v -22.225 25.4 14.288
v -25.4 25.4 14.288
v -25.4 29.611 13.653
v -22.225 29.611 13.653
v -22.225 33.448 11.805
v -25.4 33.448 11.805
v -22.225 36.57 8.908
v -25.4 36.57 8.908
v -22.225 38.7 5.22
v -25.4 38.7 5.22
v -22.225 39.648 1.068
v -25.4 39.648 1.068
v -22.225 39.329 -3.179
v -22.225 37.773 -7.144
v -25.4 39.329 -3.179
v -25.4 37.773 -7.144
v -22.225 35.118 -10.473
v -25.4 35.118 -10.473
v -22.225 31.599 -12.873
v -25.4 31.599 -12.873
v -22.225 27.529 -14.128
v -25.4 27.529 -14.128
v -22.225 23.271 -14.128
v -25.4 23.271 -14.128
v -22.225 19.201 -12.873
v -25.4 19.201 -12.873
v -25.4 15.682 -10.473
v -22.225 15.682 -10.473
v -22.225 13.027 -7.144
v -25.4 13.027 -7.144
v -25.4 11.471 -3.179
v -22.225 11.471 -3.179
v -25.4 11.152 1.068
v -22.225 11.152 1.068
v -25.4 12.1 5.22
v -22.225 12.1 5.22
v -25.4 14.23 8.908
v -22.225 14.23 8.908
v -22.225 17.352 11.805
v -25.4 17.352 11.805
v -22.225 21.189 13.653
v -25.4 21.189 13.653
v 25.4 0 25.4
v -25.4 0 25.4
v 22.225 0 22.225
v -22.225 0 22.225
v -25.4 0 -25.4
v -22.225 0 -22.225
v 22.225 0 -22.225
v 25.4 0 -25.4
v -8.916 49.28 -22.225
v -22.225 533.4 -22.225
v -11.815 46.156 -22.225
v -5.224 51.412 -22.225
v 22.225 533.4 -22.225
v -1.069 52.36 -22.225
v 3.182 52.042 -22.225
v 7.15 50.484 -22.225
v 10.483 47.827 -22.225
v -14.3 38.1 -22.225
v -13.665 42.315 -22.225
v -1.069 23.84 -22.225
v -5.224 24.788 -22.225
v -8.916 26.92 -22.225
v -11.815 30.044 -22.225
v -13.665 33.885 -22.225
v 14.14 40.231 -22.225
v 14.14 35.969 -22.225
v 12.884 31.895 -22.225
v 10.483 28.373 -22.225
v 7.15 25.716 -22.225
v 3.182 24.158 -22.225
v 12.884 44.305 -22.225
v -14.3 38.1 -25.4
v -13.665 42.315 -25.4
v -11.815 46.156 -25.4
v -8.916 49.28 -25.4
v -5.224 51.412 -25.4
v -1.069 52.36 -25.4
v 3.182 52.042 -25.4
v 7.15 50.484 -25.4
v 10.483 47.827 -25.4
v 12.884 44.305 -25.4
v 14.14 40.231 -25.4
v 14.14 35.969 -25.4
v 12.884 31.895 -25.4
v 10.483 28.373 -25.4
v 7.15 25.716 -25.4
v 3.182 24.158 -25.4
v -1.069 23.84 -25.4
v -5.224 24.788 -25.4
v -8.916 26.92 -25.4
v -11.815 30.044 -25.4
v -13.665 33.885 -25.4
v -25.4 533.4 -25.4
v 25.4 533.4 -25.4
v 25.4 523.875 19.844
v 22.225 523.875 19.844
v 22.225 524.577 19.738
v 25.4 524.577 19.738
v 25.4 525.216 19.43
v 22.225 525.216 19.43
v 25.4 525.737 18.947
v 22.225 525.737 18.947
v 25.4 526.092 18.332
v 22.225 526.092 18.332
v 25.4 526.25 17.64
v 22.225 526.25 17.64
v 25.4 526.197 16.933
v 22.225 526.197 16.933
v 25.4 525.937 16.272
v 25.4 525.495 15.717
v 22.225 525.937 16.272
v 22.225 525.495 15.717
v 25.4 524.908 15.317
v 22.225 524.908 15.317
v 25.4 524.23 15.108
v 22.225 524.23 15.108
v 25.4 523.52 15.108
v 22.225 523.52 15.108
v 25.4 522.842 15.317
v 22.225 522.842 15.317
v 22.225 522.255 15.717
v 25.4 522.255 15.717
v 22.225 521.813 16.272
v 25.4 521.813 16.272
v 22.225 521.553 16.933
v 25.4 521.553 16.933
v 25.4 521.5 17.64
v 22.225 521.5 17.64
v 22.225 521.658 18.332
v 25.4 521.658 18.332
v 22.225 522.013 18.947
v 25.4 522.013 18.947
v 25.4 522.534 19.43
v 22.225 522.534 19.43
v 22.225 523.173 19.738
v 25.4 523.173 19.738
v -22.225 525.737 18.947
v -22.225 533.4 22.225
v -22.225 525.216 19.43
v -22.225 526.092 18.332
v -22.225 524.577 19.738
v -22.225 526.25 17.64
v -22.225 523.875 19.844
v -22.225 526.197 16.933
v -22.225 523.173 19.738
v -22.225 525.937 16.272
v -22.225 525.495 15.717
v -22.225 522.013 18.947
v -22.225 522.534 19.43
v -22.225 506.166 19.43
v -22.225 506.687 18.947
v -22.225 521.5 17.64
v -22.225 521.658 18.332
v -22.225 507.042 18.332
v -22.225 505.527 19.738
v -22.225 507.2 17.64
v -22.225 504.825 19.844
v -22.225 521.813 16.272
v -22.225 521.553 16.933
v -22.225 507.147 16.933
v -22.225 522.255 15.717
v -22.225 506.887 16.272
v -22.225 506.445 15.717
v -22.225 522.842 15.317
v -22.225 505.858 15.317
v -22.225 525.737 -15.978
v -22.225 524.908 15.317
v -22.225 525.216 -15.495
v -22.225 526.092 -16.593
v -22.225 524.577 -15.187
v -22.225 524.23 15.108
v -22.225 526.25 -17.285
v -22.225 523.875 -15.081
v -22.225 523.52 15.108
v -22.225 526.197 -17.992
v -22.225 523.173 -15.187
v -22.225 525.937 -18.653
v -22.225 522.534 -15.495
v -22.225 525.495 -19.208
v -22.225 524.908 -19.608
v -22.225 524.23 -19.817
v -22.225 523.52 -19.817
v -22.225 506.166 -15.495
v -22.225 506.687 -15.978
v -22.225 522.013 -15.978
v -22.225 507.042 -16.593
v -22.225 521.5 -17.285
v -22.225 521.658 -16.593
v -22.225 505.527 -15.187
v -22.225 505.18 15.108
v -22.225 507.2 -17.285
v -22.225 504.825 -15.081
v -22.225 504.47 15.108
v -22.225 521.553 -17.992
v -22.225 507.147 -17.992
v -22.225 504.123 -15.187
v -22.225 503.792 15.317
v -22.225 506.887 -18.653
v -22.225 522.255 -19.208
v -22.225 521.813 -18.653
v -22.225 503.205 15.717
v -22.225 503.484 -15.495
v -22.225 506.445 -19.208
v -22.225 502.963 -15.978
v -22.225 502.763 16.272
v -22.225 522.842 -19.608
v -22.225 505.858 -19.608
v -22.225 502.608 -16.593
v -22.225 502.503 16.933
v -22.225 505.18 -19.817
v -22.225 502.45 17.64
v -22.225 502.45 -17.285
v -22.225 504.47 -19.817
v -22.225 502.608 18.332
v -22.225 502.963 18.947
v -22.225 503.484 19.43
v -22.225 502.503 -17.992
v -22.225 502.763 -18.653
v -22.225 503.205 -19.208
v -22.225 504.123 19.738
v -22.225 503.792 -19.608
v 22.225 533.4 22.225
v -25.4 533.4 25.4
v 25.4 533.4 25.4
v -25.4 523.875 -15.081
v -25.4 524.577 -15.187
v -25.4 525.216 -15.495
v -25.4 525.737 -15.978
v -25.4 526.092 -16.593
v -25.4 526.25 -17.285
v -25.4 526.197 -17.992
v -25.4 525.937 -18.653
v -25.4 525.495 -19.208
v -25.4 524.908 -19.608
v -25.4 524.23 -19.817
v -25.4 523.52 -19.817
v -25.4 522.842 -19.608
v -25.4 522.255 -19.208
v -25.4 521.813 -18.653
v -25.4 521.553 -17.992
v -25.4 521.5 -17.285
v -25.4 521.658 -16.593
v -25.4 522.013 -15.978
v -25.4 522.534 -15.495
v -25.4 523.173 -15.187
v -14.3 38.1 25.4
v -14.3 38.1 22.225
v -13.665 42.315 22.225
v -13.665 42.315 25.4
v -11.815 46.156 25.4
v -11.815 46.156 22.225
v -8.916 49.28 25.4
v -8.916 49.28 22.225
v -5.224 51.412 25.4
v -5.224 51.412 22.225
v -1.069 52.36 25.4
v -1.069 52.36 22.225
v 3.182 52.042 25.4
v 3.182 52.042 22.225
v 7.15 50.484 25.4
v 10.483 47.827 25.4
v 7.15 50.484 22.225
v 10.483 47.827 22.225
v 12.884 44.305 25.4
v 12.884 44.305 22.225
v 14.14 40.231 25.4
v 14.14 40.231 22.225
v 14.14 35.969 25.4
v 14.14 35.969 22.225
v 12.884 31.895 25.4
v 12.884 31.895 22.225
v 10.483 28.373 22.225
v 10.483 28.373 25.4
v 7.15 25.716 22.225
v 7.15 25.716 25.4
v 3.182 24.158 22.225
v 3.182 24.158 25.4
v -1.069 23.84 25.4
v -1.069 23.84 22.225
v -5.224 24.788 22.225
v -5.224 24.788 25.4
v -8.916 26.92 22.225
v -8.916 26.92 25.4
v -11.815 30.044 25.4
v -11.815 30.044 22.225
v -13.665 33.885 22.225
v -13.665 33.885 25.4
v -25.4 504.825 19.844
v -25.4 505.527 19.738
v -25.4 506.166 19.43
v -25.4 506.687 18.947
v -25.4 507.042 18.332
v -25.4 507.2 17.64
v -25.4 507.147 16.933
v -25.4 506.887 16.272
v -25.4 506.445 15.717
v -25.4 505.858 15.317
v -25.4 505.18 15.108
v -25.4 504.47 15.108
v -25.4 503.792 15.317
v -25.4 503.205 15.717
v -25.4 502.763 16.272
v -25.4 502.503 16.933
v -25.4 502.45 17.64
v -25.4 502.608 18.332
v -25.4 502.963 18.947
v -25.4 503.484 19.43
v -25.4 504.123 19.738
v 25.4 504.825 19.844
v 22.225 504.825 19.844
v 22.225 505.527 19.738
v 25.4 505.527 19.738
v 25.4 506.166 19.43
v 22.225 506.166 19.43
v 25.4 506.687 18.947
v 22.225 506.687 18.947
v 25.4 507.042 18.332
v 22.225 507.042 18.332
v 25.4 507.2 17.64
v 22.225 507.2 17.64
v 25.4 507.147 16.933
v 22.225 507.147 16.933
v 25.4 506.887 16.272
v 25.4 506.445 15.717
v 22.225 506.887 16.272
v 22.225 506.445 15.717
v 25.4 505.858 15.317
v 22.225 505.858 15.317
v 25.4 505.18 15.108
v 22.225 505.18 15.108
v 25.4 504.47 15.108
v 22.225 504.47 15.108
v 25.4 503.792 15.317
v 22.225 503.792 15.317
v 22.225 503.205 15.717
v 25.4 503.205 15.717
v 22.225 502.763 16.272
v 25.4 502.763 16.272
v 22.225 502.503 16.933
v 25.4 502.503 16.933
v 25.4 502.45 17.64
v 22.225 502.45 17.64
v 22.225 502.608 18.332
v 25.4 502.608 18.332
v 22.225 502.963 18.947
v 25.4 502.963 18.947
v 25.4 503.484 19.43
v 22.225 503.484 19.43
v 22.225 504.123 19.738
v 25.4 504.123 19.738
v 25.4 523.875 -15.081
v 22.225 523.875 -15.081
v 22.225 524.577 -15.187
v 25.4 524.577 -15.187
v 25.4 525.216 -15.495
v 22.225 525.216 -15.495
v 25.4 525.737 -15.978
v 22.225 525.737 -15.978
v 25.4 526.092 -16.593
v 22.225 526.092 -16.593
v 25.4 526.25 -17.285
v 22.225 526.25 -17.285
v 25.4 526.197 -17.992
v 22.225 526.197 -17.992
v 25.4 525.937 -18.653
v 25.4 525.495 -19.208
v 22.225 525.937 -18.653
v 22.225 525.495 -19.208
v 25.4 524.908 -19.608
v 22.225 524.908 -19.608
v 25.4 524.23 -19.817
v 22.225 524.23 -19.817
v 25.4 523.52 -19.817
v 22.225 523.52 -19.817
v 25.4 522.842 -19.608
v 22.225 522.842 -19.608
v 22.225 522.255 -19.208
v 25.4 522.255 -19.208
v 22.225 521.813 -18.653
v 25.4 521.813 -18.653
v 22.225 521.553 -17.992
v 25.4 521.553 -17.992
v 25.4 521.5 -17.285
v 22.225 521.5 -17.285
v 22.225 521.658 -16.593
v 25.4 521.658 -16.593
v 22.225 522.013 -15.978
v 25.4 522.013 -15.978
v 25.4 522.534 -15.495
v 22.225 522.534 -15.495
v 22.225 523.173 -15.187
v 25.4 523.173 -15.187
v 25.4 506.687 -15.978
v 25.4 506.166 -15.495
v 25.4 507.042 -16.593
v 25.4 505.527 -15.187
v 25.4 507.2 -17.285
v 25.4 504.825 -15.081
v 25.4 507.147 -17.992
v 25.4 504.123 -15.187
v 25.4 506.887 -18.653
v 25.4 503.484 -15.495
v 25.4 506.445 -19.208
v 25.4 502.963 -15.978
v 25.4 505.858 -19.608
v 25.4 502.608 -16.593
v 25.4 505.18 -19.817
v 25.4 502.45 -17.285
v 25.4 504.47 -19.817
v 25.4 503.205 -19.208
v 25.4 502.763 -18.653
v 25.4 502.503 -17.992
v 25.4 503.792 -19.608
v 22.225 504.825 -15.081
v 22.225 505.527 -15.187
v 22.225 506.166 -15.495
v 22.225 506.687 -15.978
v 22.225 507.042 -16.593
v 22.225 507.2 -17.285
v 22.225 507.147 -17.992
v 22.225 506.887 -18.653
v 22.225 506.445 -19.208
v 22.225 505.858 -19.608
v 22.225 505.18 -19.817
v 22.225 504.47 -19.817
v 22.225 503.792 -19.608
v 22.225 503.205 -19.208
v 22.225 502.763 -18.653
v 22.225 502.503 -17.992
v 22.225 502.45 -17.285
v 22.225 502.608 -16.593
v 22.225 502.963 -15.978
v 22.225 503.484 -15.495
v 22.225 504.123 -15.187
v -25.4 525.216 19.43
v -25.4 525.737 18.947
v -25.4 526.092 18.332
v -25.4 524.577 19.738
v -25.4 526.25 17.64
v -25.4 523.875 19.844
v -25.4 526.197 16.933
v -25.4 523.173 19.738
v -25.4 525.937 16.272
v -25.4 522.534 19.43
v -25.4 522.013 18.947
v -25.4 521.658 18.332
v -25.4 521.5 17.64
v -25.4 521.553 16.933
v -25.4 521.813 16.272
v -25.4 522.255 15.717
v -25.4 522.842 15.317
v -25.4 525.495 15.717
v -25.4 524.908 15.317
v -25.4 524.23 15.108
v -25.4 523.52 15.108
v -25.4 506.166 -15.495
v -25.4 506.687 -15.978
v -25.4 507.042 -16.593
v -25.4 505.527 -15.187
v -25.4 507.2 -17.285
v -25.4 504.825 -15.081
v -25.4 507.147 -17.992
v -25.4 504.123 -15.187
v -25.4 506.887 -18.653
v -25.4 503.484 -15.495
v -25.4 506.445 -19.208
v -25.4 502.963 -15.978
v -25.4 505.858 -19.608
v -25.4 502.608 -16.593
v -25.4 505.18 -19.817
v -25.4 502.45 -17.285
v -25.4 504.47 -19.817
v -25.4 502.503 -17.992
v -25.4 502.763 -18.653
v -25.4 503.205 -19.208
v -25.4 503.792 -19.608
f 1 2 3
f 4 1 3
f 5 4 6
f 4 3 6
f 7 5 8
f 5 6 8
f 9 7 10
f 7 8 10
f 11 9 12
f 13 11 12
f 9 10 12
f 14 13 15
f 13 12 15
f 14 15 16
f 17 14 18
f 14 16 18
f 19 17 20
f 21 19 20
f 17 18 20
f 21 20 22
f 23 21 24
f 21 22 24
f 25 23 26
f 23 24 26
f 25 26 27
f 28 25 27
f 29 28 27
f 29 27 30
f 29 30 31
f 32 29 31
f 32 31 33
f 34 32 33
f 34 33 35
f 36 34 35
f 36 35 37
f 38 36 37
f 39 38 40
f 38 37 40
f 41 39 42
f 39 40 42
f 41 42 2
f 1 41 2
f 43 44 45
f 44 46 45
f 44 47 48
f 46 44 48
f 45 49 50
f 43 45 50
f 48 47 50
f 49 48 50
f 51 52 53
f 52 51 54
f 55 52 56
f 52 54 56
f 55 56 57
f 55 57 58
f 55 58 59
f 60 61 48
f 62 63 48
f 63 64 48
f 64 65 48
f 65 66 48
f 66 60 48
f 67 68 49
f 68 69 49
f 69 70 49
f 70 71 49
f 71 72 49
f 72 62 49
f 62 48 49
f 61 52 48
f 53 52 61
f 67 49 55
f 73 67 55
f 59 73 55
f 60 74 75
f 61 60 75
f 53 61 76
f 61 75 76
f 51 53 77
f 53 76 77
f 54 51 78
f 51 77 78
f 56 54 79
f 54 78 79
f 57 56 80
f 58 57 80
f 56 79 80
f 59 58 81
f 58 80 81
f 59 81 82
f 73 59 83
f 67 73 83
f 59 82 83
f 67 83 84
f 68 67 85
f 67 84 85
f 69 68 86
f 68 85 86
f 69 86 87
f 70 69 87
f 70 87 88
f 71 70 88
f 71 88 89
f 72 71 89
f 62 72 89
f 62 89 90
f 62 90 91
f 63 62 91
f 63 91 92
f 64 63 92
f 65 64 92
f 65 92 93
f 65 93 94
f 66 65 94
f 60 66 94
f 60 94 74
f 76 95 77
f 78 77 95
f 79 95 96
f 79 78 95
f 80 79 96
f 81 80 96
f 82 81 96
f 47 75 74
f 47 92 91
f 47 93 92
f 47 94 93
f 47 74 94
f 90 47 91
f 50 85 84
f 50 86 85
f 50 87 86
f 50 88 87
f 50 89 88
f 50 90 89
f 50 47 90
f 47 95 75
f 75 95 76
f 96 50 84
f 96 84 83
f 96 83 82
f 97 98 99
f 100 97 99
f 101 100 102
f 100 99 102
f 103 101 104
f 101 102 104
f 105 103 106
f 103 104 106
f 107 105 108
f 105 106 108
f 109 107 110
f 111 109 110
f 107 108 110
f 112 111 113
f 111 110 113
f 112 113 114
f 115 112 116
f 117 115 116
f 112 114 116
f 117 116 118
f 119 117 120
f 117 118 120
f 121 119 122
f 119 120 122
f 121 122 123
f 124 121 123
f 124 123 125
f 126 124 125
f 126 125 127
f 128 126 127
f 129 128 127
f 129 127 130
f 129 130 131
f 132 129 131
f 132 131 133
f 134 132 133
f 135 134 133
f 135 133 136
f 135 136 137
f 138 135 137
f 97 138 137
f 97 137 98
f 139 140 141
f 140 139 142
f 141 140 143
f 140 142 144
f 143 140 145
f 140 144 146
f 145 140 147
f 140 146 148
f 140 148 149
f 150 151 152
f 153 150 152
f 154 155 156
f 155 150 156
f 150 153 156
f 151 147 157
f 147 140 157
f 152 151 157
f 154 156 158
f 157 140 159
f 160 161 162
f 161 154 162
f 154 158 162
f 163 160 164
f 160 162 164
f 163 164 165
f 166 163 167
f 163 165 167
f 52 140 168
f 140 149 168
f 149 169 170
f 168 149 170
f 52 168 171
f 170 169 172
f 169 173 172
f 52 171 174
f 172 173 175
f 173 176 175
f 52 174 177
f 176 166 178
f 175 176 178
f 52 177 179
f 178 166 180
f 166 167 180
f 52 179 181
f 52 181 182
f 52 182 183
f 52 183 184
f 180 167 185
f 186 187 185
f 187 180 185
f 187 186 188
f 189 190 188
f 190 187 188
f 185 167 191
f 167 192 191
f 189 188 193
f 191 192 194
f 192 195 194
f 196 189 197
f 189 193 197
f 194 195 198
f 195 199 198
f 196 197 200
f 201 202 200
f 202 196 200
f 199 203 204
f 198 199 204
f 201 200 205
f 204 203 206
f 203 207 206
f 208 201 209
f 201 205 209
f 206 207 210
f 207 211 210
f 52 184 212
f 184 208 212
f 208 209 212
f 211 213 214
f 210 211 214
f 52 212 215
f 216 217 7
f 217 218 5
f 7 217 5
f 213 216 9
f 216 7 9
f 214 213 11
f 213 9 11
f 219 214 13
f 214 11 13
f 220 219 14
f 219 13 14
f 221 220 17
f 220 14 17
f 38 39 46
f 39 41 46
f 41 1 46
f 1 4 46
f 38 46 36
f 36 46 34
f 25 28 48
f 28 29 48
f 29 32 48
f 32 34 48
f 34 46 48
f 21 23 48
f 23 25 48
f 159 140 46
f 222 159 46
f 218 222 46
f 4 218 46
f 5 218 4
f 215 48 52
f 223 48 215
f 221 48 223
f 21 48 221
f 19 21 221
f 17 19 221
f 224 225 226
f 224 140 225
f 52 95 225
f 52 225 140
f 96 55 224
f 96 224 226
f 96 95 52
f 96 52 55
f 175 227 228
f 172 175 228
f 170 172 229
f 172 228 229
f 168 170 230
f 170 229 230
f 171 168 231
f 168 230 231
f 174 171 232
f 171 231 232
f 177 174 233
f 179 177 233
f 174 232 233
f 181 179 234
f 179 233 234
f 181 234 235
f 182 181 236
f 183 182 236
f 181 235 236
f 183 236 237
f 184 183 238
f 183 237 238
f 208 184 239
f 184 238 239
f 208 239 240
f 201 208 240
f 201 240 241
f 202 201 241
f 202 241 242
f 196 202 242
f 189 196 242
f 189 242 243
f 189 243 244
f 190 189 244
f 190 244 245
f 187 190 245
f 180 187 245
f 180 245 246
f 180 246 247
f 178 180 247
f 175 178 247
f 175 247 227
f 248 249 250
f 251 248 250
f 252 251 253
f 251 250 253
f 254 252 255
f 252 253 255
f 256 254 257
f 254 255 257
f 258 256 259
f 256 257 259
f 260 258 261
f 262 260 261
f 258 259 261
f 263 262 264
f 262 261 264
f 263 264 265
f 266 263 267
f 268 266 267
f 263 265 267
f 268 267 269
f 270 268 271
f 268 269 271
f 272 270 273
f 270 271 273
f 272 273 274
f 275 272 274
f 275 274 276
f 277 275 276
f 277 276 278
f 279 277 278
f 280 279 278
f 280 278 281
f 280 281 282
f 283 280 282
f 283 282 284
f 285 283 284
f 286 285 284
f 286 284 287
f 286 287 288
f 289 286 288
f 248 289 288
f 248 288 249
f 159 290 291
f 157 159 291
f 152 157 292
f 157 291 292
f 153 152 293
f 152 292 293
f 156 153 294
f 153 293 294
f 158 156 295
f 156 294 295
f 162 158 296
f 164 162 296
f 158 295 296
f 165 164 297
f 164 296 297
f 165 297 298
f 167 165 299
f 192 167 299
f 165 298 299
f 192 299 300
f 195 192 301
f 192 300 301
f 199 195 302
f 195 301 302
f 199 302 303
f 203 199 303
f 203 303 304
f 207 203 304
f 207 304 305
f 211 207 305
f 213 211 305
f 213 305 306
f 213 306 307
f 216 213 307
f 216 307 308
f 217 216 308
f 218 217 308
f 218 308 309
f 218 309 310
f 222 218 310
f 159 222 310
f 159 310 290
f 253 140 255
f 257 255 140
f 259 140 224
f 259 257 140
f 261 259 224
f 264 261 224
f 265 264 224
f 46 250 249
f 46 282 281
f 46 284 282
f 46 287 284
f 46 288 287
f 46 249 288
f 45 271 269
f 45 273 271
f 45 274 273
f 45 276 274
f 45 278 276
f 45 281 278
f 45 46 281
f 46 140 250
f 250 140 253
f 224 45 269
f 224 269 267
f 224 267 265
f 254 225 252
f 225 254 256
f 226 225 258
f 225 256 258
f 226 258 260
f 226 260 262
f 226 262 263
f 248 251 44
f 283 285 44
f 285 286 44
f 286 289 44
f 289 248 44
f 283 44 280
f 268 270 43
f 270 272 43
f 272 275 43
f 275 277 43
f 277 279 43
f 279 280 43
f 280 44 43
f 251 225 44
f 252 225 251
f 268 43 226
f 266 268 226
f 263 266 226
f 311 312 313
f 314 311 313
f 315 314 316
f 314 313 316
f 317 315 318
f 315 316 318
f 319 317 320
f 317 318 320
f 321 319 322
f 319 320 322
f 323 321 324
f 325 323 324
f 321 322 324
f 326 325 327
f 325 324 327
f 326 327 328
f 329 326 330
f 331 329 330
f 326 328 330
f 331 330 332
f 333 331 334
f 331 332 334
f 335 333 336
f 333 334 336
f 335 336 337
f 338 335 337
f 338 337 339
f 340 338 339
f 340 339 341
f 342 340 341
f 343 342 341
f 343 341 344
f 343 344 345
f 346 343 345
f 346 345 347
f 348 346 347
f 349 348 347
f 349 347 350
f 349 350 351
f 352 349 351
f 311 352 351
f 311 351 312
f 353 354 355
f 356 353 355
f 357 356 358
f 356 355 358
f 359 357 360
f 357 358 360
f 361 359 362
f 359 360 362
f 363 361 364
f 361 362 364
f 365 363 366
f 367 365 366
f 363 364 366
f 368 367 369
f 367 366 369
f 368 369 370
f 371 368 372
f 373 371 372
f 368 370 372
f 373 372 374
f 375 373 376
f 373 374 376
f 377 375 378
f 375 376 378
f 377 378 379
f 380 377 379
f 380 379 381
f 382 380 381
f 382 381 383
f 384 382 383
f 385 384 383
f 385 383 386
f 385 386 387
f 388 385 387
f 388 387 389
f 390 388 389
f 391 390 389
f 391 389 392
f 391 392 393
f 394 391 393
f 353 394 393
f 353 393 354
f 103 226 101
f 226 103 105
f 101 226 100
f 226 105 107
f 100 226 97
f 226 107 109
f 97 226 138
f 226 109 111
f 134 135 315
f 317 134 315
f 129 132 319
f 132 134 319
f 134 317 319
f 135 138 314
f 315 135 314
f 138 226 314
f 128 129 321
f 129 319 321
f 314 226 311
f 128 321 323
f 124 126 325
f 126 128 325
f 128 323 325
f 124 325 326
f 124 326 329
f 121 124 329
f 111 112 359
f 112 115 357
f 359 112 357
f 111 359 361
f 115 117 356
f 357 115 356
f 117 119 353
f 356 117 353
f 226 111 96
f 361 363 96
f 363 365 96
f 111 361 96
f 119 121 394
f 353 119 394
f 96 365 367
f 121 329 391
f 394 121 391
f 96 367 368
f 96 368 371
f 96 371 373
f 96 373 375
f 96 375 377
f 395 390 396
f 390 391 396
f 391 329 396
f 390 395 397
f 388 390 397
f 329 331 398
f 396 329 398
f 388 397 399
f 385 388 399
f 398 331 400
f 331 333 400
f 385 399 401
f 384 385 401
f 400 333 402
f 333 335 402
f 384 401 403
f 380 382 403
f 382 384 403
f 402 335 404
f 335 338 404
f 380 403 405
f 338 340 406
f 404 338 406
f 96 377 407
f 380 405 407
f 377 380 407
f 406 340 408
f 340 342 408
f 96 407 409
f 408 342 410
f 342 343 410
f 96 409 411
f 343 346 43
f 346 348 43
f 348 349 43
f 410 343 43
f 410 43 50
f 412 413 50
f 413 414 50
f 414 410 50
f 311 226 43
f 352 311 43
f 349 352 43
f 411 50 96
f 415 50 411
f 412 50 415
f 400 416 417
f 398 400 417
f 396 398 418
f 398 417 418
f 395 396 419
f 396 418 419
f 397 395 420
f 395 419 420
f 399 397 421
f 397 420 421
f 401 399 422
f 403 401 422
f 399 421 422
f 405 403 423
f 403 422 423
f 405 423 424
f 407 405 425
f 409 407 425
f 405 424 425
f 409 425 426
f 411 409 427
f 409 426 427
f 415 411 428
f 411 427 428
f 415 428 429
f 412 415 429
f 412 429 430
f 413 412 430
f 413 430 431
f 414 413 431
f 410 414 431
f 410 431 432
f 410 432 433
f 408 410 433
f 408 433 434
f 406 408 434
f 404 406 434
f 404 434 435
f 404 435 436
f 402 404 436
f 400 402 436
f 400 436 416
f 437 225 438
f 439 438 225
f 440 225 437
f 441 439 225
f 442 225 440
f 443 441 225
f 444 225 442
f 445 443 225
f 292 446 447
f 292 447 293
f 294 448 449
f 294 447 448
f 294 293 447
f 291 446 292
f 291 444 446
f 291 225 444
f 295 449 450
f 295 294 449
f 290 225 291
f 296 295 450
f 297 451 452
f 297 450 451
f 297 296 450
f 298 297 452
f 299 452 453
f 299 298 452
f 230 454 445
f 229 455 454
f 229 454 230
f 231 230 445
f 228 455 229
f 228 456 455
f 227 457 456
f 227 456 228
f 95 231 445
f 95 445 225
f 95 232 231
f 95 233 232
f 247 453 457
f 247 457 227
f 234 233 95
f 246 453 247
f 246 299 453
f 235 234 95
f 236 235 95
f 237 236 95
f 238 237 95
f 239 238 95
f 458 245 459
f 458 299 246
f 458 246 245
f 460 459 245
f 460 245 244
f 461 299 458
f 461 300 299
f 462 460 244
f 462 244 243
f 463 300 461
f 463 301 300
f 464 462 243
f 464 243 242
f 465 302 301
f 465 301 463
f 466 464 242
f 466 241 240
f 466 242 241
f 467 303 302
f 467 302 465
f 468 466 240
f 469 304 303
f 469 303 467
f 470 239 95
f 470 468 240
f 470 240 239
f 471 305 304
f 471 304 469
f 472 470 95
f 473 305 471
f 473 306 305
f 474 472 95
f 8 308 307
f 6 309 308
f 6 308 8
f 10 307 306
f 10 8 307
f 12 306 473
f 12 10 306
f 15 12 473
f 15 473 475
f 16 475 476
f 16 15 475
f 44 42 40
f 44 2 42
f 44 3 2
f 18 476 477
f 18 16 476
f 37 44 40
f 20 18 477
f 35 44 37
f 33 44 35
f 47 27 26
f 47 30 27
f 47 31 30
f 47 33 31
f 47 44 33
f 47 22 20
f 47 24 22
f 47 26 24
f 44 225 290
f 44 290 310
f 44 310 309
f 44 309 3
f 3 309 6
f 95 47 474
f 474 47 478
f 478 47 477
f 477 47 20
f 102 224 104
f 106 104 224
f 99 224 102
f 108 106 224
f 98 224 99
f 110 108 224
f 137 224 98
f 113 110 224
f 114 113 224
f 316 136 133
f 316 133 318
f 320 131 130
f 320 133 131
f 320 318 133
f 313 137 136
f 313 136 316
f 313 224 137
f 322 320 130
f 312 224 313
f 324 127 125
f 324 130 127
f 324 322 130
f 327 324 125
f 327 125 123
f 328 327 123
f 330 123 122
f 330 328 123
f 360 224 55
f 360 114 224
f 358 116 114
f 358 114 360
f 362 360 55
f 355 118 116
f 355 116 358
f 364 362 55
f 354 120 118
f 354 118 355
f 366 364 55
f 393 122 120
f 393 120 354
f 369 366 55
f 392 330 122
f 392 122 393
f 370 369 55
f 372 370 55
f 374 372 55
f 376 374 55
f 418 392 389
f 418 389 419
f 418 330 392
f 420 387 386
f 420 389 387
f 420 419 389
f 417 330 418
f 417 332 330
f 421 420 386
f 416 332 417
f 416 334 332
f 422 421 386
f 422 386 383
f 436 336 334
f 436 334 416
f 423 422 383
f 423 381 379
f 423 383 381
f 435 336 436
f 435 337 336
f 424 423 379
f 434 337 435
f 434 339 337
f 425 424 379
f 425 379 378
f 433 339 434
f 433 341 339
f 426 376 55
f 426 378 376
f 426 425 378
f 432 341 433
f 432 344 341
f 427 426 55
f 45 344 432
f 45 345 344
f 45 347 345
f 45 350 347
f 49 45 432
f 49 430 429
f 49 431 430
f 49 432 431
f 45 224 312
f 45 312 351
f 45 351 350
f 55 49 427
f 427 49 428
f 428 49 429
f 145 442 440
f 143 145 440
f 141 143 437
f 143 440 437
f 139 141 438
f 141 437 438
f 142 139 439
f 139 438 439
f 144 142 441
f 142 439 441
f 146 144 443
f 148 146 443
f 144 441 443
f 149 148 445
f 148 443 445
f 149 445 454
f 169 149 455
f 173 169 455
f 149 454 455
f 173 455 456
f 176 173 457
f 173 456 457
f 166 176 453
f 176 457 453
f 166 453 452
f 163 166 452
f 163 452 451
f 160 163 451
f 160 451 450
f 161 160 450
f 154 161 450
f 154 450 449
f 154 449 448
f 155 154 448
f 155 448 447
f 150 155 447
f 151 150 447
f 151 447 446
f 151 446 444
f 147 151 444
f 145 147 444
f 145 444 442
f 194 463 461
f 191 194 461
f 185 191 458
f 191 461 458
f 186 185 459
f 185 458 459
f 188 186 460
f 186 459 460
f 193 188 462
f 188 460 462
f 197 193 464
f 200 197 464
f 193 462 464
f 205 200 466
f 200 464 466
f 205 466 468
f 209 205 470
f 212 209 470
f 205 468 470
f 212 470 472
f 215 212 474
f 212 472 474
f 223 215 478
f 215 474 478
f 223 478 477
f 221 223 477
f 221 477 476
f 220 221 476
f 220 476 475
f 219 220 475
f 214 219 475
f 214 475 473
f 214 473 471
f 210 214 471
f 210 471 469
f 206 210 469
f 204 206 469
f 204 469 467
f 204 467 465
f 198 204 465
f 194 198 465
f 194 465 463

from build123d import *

# Parameters (mm, degrees)
SKETCH1_W           = 50.8
SKETCH1_H           = 50.8
SKETCH1_W_2         = 44.45
SKETCH1_H_2         = 44.45
BOSS_EXTRUDE1_DEPTH = 533.4
SKETCH2_R           = 14.2875
CUT_EXTRUDE1_DEPTH  = 3.175
SKETCH3_R           = 14.3002
CUT_EXTRUDE2_DEPTH  = 537.415286881
SKETCH4_R           = 2.38125
CUT_EXTRUDE3_DEPTH  = 537.415286881


with BuildPart() as part:
    # Sketch1 → Boss-Extrude1 (new body)
    with BuildSketch(Plane(origin=(0, 0, 0), x_dir=(1, 0, 0), z_dir=(0, 1, 0))):
        Rectangle(SKETCH1_W, SKETCH1_H)
        Rectangle(SKETCH1_W_2, SKETCH1_H_2, mode=Mode.SUBTRACT)
    extrude(amount=BOSS_EXTRUDE1_DEPTH)

    # Sketch2 → Cut-Extrude1 (cut)
    with BuildSketch(Plane.ZY.offset(25.4)):
        with Locations((0, 25.4)):
            Circle(SKETCH2_R)
    extrude(amount=-CUT_EXTRUDE1_DEPTH, mode=Mode.SUBTRACT)

    # Sketch3 → Cut-Extrude2 (cut, through all)
    with BuildSketch(Plane(origin=(0, 0, -25.4), x_dir=(-1, 0, 0), z_dir=(0, 0, -1))):
        with Locations((0, 38.1)):
            Circle(SKETCH3_R)
    extrude(amount=-CUT_EXTRUDE2_DEPTH, mode=Mode.SUBTRACT)

    # Sketch4 → Cut-Extrude3 (cut, through all)
    with BuildSketch(Plane.ZY.offset(25.4)):
        with Locations((17.4625, 523.875)):
            Circle(SKETCH4_R)
        with Locations((17.4625, 504.825)):
            Circle(SKETCH4_R)
        with Locations((-17.4625, 504.825)):
            Circle(SKETCH4_R)
        with Locations((-17.4625, 523.875)):
            Circle(SKETCH4_R)
    extrude(amount=-CUT_EXTRUDE3_DEPTH, mode=Mode.SUBTRACT)


solid = part.part
